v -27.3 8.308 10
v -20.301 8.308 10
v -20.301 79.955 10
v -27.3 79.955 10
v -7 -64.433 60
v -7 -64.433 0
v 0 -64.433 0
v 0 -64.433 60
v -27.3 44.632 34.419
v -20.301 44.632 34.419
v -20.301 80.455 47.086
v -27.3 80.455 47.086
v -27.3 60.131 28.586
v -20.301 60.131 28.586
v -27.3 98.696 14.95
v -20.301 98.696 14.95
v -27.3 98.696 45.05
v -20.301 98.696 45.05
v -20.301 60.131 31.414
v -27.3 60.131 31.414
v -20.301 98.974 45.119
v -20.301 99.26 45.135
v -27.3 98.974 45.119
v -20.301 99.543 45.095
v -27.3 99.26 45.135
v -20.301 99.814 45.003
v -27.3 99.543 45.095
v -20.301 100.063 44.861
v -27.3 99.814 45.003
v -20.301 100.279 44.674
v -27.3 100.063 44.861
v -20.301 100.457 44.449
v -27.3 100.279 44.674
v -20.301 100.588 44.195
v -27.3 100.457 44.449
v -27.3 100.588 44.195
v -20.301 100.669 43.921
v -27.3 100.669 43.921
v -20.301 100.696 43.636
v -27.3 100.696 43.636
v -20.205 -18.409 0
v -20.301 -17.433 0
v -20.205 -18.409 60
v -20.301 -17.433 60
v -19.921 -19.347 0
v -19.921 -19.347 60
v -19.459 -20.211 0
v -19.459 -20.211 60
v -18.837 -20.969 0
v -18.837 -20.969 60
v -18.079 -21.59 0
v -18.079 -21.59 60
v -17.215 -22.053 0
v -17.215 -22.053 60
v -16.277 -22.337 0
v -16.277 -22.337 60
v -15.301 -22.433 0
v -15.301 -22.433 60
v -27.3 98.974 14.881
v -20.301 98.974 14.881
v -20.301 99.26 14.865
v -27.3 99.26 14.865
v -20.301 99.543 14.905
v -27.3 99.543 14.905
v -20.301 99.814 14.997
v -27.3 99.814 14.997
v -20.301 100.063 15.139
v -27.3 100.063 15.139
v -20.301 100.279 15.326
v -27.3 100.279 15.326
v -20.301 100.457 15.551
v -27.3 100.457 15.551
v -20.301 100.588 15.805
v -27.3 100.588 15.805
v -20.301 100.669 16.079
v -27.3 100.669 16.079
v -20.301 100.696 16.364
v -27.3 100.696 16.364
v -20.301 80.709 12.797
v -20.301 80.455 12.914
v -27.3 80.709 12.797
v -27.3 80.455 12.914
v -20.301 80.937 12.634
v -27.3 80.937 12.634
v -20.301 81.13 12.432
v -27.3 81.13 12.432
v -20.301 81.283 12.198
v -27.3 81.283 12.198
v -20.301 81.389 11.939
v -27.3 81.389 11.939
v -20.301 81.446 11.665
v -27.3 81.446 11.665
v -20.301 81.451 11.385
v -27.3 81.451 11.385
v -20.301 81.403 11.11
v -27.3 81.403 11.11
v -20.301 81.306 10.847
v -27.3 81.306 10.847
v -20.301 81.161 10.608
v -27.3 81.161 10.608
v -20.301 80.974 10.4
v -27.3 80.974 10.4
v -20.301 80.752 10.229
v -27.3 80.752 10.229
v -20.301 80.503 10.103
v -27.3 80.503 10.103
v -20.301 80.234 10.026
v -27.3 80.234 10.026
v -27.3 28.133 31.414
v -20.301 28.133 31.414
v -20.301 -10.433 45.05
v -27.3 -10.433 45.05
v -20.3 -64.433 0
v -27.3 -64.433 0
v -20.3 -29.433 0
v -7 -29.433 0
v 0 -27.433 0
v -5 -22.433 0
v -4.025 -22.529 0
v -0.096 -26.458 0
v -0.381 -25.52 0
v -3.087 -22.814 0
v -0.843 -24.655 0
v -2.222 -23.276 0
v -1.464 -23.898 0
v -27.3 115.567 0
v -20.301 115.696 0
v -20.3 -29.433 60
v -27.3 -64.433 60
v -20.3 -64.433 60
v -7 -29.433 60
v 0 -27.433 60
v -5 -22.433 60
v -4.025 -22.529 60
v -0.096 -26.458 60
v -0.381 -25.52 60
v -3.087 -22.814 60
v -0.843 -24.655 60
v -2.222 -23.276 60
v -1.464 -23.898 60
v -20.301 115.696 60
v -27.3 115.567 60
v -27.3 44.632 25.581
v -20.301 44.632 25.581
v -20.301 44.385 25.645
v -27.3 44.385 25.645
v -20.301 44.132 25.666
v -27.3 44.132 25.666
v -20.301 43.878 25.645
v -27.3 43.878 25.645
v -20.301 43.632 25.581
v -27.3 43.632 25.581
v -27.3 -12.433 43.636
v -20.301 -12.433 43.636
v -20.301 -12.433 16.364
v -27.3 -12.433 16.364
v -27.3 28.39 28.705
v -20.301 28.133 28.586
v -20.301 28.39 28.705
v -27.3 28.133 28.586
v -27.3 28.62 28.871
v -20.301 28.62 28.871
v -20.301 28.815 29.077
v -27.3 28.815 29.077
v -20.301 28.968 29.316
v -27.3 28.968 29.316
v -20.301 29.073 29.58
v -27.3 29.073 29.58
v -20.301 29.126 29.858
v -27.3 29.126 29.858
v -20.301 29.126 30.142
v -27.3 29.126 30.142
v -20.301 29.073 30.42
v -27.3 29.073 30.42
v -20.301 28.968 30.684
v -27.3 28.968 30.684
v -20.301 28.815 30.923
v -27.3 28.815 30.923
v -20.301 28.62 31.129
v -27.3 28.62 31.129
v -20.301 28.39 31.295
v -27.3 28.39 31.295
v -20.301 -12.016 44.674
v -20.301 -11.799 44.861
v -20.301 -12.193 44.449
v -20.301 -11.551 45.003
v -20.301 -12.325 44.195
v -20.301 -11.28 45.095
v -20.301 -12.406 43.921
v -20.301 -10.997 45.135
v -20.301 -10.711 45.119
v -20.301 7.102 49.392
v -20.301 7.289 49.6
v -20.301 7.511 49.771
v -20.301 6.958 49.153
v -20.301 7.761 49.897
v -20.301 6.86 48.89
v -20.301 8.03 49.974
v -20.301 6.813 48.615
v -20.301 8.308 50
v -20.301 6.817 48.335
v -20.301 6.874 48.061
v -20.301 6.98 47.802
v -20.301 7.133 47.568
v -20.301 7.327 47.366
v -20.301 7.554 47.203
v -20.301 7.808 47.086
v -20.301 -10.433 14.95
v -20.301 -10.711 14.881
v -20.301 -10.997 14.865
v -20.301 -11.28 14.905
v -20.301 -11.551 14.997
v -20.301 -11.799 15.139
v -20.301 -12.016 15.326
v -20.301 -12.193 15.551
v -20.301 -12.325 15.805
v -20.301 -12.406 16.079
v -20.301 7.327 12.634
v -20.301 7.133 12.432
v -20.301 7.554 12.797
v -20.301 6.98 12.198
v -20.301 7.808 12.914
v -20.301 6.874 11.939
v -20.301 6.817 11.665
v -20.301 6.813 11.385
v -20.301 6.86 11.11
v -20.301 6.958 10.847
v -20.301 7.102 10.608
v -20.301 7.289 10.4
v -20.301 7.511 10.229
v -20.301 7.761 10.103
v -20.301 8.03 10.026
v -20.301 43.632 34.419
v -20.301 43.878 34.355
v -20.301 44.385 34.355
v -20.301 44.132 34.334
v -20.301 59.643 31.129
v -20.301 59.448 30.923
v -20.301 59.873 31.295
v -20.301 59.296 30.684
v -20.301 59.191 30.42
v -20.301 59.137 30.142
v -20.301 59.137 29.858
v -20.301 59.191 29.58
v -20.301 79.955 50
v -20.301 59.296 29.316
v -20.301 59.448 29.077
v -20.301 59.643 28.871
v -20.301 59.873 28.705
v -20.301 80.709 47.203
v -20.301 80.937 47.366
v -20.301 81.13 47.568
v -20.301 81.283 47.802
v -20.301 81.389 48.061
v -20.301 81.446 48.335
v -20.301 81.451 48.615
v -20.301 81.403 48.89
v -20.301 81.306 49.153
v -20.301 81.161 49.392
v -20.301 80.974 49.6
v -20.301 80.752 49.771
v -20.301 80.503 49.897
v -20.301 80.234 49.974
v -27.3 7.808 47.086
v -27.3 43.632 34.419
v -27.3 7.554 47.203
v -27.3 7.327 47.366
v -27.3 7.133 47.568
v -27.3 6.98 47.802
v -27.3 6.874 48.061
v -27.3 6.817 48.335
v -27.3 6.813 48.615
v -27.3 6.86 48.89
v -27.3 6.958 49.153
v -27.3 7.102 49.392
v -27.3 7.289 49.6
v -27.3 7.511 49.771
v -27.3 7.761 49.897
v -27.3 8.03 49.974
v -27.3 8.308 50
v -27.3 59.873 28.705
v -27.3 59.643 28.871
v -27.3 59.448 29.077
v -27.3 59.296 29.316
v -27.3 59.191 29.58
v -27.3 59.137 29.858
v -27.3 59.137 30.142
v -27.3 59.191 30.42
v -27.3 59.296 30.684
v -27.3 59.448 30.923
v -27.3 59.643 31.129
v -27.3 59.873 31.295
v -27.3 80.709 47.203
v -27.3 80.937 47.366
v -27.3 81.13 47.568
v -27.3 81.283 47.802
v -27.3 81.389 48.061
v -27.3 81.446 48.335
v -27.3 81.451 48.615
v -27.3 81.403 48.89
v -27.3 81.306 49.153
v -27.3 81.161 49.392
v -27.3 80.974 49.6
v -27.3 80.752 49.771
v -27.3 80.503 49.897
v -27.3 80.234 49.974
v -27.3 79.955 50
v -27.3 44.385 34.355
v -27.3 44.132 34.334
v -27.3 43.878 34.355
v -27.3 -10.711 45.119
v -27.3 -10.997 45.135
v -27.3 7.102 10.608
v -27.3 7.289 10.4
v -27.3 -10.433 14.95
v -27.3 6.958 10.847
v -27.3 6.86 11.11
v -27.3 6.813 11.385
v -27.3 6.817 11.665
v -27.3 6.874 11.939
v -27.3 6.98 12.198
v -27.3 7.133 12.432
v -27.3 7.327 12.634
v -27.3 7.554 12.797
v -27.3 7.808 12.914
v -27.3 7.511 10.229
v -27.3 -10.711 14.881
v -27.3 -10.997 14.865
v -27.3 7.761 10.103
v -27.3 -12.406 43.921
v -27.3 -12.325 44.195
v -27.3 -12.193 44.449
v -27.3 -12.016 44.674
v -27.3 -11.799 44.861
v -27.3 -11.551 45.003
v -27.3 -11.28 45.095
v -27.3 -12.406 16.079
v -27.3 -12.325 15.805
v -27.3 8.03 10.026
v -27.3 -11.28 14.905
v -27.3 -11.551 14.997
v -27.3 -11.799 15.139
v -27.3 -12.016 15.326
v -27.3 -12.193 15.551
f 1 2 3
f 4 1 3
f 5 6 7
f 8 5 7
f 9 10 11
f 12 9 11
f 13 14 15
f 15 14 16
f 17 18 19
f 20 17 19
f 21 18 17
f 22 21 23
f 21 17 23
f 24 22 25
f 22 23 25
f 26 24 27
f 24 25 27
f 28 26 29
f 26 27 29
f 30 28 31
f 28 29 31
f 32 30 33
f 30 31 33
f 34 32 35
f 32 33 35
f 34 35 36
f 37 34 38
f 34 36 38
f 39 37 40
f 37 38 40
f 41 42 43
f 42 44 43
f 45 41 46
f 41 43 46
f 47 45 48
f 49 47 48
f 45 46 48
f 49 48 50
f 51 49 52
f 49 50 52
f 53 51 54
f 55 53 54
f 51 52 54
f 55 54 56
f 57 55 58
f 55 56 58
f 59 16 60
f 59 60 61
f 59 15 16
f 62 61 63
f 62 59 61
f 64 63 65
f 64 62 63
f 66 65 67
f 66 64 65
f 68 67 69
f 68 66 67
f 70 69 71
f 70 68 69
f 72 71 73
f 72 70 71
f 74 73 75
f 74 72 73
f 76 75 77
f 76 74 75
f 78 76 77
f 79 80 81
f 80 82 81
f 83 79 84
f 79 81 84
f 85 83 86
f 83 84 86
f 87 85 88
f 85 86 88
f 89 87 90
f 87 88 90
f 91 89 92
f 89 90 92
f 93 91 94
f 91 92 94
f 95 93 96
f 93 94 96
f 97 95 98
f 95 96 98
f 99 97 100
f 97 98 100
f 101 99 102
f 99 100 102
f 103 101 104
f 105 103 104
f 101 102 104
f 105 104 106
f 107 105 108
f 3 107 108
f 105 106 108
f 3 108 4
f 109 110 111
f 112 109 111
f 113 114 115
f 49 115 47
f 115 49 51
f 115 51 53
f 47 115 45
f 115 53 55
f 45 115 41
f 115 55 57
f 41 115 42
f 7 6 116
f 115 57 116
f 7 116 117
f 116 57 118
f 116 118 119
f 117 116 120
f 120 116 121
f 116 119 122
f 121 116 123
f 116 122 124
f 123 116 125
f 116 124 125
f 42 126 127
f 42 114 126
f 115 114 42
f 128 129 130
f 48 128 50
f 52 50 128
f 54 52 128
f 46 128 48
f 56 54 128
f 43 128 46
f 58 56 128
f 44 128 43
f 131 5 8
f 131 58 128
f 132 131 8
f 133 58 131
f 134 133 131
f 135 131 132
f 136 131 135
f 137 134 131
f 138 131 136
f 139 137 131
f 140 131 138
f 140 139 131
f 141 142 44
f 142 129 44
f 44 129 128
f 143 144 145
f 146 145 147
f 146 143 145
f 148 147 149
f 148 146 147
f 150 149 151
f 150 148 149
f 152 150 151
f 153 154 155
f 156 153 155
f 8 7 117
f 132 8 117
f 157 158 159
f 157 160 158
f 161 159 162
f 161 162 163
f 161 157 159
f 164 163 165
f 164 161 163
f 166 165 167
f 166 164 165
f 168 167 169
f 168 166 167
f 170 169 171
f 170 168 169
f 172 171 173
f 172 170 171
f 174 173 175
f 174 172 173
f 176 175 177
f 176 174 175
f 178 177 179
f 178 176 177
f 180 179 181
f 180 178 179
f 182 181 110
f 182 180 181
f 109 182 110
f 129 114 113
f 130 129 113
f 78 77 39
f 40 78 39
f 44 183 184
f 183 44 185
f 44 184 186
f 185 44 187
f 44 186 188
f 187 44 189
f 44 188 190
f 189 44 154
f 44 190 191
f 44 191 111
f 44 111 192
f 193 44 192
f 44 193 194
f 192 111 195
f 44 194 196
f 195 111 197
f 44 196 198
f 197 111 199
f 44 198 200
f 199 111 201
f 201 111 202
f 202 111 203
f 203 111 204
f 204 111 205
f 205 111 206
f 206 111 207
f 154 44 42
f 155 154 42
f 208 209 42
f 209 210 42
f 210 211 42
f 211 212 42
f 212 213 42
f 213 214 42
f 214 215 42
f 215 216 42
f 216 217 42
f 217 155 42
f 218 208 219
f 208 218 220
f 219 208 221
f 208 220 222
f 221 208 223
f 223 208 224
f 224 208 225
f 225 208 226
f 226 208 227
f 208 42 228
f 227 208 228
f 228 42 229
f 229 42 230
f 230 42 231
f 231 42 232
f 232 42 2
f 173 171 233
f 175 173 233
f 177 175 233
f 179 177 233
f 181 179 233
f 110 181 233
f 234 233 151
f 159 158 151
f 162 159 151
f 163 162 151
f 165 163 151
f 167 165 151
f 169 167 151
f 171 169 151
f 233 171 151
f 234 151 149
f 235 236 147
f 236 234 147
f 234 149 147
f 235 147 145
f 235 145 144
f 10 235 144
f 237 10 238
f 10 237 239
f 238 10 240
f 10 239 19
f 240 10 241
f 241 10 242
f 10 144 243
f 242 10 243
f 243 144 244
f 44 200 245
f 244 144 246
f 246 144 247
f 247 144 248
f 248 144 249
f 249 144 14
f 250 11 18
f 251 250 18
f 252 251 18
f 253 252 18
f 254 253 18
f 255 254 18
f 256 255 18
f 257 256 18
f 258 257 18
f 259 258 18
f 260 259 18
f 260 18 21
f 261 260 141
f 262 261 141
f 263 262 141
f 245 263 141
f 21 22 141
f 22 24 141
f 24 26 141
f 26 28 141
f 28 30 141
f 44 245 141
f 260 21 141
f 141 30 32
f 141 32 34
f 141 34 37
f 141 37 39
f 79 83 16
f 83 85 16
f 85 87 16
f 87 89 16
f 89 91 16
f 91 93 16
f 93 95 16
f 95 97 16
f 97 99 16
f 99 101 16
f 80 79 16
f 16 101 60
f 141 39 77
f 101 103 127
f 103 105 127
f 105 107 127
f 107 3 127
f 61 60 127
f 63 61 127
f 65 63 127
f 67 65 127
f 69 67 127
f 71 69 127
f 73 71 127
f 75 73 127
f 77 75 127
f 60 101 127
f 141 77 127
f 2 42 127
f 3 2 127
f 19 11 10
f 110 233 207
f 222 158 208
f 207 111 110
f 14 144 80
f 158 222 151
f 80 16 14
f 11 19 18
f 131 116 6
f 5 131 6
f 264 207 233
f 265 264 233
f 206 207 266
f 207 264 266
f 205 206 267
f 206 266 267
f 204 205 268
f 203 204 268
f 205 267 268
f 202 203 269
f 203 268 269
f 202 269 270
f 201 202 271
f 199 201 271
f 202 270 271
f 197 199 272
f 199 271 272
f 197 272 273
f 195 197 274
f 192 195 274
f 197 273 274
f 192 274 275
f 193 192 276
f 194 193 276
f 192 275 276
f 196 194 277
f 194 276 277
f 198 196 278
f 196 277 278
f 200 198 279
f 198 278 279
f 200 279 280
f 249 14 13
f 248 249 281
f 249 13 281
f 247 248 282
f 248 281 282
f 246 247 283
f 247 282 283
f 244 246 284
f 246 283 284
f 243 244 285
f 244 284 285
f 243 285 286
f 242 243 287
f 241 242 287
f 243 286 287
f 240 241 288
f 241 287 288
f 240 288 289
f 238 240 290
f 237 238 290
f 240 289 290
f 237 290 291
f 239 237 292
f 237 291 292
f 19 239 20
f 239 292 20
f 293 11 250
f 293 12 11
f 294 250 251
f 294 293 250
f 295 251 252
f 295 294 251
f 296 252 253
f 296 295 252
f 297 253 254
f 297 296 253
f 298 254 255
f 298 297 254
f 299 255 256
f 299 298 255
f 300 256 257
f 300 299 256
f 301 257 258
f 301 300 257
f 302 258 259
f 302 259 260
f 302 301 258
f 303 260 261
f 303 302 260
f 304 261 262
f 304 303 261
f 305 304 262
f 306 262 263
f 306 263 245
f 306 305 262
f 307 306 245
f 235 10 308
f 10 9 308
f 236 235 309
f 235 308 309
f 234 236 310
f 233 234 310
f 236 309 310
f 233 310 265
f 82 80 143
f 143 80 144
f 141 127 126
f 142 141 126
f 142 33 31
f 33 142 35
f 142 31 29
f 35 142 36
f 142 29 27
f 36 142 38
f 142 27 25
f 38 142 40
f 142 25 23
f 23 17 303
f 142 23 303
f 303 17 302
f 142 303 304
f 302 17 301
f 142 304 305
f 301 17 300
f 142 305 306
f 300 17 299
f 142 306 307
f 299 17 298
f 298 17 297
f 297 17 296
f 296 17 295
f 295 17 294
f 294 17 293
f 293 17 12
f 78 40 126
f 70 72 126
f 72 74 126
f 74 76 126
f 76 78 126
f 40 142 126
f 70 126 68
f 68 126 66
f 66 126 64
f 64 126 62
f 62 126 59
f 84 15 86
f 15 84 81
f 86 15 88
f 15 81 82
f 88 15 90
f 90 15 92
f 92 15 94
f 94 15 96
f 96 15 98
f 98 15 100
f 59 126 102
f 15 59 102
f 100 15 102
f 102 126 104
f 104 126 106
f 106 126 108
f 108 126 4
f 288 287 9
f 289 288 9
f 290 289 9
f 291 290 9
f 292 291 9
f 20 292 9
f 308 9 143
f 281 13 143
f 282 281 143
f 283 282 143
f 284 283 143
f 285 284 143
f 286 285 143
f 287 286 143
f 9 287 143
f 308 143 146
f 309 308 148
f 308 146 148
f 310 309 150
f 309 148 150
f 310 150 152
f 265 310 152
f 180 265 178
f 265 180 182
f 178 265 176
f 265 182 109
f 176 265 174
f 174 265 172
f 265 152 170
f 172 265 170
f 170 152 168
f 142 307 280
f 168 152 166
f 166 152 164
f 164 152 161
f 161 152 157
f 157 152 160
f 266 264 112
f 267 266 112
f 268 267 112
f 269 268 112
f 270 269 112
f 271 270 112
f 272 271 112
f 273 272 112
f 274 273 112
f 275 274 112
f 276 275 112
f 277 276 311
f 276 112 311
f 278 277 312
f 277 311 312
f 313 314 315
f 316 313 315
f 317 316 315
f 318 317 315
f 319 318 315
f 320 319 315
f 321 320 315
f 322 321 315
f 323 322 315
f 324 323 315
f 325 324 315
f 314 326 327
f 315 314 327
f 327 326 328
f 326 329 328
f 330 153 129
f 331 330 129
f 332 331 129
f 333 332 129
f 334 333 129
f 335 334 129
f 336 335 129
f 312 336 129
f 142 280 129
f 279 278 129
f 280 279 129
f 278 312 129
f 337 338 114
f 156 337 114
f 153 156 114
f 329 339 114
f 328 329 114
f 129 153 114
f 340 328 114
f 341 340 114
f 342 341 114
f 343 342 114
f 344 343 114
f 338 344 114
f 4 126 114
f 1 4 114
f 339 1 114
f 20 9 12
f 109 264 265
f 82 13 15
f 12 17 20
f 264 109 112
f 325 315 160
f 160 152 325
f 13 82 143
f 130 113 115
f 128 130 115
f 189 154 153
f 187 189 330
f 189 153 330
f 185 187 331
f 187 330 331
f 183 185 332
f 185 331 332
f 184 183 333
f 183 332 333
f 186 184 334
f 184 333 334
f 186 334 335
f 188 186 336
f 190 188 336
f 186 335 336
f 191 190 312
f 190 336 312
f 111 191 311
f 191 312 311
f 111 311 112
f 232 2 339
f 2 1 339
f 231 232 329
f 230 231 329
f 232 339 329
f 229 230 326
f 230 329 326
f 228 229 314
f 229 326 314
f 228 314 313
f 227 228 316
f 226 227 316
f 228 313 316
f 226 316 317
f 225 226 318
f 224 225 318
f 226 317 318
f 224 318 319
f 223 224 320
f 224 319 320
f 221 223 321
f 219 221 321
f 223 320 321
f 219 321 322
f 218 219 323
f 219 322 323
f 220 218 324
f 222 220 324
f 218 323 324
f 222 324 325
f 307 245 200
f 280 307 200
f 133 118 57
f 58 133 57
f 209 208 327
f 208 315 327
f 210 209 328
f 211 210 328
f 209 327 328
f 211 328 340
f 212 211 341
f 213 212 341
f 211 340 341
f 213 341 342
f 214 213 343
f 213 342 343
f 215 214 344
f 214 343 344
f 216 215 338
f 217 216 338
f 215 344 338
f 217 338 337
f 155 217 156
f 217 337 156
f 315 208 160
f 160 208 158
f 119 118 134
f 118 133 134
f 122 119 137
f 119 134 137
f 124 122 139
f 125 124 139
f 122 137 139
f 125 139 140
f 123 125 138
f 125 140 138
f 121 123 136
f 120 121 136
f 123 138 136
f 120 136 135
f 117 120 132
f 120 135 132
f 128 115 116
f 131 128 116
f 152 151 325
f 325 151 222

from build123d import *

# Parameters (mm, degrees)
F1_DEPTH = 60
F3_DEPTH = 25
F4_R     = 5
F5_R     = 1.5


with BuildPart() as f1:
    # F0 (on Top) → F1 (new body)
    with BuildSketch(Plane.XY):
        Polygon((-20.3012, 115.696498), (-27.3, 115.56689), (-27.3, -64.43311), (-20.3, -64.43311), (-20.3, -29.43311), (-7, -29.43311), (-7, -64.43311), (0, -64.43311), (0, -22.43311), (-20.3012, -22.43311), align=None)
    extrude(amount=F1_DEPTH)

    # F2 (on face) → F3 (cut)
    with BuildSketch(Plane.YZ.offset(-20.3012)):
        Polygon((32.132399, 30), (-12.43311, 45.757328), (-12.43311, 14.242672), align=None)
        Polygon((88.697203, 50), (-0.433815, 50), (44.131694, 34.242672), align=None)
        Polygon((100.696498, 14.242672), (100.696498, 45.757328), (56.130989, 30), align=None)
        Polygon((44.131694, 25.757328), (-0.433815, 10), (88.697203, 10), align=None)
    extrude(amount=-F3_DEPTH, mode=Mode.SUBTRACT)

    # F4
    f4_edges = [f1.edges().sort_by_distance(p)[0] for p in [
        (0, -22.43311, 30),
        (-20.3012, -22.43311, 30),
    ]]
    fillet(f4_edges, radius=F4_R)

    # F5
    f5_edges = [f1.edges().sort_by_distance(p)[0] for p in [
        (-23.8006, -12.43311, 14.242672),
        (-23.8006, -12.43311, 45.757328),
        (-23.8006, -0.433815, 10),
        (-23.8006, -0.433815, 50),
        (-23.8006, 32.132399, 30),
        (-23.8006, 44.131694, 34.242672),
        (-23.8006, 44.131694, 25.757328),
        (-23.8006, 56.130989, 30),
        (-23.8006, 88.697203, 50),
        (-23.8006, 100.696498, 45.757328),
        (-23.8006, 100.696498, 14.242672),
        (-23.8006, 88.697203, 10),
    ]]
    fillet(f5_edges, radius=F5_R)


solid = f1.part
